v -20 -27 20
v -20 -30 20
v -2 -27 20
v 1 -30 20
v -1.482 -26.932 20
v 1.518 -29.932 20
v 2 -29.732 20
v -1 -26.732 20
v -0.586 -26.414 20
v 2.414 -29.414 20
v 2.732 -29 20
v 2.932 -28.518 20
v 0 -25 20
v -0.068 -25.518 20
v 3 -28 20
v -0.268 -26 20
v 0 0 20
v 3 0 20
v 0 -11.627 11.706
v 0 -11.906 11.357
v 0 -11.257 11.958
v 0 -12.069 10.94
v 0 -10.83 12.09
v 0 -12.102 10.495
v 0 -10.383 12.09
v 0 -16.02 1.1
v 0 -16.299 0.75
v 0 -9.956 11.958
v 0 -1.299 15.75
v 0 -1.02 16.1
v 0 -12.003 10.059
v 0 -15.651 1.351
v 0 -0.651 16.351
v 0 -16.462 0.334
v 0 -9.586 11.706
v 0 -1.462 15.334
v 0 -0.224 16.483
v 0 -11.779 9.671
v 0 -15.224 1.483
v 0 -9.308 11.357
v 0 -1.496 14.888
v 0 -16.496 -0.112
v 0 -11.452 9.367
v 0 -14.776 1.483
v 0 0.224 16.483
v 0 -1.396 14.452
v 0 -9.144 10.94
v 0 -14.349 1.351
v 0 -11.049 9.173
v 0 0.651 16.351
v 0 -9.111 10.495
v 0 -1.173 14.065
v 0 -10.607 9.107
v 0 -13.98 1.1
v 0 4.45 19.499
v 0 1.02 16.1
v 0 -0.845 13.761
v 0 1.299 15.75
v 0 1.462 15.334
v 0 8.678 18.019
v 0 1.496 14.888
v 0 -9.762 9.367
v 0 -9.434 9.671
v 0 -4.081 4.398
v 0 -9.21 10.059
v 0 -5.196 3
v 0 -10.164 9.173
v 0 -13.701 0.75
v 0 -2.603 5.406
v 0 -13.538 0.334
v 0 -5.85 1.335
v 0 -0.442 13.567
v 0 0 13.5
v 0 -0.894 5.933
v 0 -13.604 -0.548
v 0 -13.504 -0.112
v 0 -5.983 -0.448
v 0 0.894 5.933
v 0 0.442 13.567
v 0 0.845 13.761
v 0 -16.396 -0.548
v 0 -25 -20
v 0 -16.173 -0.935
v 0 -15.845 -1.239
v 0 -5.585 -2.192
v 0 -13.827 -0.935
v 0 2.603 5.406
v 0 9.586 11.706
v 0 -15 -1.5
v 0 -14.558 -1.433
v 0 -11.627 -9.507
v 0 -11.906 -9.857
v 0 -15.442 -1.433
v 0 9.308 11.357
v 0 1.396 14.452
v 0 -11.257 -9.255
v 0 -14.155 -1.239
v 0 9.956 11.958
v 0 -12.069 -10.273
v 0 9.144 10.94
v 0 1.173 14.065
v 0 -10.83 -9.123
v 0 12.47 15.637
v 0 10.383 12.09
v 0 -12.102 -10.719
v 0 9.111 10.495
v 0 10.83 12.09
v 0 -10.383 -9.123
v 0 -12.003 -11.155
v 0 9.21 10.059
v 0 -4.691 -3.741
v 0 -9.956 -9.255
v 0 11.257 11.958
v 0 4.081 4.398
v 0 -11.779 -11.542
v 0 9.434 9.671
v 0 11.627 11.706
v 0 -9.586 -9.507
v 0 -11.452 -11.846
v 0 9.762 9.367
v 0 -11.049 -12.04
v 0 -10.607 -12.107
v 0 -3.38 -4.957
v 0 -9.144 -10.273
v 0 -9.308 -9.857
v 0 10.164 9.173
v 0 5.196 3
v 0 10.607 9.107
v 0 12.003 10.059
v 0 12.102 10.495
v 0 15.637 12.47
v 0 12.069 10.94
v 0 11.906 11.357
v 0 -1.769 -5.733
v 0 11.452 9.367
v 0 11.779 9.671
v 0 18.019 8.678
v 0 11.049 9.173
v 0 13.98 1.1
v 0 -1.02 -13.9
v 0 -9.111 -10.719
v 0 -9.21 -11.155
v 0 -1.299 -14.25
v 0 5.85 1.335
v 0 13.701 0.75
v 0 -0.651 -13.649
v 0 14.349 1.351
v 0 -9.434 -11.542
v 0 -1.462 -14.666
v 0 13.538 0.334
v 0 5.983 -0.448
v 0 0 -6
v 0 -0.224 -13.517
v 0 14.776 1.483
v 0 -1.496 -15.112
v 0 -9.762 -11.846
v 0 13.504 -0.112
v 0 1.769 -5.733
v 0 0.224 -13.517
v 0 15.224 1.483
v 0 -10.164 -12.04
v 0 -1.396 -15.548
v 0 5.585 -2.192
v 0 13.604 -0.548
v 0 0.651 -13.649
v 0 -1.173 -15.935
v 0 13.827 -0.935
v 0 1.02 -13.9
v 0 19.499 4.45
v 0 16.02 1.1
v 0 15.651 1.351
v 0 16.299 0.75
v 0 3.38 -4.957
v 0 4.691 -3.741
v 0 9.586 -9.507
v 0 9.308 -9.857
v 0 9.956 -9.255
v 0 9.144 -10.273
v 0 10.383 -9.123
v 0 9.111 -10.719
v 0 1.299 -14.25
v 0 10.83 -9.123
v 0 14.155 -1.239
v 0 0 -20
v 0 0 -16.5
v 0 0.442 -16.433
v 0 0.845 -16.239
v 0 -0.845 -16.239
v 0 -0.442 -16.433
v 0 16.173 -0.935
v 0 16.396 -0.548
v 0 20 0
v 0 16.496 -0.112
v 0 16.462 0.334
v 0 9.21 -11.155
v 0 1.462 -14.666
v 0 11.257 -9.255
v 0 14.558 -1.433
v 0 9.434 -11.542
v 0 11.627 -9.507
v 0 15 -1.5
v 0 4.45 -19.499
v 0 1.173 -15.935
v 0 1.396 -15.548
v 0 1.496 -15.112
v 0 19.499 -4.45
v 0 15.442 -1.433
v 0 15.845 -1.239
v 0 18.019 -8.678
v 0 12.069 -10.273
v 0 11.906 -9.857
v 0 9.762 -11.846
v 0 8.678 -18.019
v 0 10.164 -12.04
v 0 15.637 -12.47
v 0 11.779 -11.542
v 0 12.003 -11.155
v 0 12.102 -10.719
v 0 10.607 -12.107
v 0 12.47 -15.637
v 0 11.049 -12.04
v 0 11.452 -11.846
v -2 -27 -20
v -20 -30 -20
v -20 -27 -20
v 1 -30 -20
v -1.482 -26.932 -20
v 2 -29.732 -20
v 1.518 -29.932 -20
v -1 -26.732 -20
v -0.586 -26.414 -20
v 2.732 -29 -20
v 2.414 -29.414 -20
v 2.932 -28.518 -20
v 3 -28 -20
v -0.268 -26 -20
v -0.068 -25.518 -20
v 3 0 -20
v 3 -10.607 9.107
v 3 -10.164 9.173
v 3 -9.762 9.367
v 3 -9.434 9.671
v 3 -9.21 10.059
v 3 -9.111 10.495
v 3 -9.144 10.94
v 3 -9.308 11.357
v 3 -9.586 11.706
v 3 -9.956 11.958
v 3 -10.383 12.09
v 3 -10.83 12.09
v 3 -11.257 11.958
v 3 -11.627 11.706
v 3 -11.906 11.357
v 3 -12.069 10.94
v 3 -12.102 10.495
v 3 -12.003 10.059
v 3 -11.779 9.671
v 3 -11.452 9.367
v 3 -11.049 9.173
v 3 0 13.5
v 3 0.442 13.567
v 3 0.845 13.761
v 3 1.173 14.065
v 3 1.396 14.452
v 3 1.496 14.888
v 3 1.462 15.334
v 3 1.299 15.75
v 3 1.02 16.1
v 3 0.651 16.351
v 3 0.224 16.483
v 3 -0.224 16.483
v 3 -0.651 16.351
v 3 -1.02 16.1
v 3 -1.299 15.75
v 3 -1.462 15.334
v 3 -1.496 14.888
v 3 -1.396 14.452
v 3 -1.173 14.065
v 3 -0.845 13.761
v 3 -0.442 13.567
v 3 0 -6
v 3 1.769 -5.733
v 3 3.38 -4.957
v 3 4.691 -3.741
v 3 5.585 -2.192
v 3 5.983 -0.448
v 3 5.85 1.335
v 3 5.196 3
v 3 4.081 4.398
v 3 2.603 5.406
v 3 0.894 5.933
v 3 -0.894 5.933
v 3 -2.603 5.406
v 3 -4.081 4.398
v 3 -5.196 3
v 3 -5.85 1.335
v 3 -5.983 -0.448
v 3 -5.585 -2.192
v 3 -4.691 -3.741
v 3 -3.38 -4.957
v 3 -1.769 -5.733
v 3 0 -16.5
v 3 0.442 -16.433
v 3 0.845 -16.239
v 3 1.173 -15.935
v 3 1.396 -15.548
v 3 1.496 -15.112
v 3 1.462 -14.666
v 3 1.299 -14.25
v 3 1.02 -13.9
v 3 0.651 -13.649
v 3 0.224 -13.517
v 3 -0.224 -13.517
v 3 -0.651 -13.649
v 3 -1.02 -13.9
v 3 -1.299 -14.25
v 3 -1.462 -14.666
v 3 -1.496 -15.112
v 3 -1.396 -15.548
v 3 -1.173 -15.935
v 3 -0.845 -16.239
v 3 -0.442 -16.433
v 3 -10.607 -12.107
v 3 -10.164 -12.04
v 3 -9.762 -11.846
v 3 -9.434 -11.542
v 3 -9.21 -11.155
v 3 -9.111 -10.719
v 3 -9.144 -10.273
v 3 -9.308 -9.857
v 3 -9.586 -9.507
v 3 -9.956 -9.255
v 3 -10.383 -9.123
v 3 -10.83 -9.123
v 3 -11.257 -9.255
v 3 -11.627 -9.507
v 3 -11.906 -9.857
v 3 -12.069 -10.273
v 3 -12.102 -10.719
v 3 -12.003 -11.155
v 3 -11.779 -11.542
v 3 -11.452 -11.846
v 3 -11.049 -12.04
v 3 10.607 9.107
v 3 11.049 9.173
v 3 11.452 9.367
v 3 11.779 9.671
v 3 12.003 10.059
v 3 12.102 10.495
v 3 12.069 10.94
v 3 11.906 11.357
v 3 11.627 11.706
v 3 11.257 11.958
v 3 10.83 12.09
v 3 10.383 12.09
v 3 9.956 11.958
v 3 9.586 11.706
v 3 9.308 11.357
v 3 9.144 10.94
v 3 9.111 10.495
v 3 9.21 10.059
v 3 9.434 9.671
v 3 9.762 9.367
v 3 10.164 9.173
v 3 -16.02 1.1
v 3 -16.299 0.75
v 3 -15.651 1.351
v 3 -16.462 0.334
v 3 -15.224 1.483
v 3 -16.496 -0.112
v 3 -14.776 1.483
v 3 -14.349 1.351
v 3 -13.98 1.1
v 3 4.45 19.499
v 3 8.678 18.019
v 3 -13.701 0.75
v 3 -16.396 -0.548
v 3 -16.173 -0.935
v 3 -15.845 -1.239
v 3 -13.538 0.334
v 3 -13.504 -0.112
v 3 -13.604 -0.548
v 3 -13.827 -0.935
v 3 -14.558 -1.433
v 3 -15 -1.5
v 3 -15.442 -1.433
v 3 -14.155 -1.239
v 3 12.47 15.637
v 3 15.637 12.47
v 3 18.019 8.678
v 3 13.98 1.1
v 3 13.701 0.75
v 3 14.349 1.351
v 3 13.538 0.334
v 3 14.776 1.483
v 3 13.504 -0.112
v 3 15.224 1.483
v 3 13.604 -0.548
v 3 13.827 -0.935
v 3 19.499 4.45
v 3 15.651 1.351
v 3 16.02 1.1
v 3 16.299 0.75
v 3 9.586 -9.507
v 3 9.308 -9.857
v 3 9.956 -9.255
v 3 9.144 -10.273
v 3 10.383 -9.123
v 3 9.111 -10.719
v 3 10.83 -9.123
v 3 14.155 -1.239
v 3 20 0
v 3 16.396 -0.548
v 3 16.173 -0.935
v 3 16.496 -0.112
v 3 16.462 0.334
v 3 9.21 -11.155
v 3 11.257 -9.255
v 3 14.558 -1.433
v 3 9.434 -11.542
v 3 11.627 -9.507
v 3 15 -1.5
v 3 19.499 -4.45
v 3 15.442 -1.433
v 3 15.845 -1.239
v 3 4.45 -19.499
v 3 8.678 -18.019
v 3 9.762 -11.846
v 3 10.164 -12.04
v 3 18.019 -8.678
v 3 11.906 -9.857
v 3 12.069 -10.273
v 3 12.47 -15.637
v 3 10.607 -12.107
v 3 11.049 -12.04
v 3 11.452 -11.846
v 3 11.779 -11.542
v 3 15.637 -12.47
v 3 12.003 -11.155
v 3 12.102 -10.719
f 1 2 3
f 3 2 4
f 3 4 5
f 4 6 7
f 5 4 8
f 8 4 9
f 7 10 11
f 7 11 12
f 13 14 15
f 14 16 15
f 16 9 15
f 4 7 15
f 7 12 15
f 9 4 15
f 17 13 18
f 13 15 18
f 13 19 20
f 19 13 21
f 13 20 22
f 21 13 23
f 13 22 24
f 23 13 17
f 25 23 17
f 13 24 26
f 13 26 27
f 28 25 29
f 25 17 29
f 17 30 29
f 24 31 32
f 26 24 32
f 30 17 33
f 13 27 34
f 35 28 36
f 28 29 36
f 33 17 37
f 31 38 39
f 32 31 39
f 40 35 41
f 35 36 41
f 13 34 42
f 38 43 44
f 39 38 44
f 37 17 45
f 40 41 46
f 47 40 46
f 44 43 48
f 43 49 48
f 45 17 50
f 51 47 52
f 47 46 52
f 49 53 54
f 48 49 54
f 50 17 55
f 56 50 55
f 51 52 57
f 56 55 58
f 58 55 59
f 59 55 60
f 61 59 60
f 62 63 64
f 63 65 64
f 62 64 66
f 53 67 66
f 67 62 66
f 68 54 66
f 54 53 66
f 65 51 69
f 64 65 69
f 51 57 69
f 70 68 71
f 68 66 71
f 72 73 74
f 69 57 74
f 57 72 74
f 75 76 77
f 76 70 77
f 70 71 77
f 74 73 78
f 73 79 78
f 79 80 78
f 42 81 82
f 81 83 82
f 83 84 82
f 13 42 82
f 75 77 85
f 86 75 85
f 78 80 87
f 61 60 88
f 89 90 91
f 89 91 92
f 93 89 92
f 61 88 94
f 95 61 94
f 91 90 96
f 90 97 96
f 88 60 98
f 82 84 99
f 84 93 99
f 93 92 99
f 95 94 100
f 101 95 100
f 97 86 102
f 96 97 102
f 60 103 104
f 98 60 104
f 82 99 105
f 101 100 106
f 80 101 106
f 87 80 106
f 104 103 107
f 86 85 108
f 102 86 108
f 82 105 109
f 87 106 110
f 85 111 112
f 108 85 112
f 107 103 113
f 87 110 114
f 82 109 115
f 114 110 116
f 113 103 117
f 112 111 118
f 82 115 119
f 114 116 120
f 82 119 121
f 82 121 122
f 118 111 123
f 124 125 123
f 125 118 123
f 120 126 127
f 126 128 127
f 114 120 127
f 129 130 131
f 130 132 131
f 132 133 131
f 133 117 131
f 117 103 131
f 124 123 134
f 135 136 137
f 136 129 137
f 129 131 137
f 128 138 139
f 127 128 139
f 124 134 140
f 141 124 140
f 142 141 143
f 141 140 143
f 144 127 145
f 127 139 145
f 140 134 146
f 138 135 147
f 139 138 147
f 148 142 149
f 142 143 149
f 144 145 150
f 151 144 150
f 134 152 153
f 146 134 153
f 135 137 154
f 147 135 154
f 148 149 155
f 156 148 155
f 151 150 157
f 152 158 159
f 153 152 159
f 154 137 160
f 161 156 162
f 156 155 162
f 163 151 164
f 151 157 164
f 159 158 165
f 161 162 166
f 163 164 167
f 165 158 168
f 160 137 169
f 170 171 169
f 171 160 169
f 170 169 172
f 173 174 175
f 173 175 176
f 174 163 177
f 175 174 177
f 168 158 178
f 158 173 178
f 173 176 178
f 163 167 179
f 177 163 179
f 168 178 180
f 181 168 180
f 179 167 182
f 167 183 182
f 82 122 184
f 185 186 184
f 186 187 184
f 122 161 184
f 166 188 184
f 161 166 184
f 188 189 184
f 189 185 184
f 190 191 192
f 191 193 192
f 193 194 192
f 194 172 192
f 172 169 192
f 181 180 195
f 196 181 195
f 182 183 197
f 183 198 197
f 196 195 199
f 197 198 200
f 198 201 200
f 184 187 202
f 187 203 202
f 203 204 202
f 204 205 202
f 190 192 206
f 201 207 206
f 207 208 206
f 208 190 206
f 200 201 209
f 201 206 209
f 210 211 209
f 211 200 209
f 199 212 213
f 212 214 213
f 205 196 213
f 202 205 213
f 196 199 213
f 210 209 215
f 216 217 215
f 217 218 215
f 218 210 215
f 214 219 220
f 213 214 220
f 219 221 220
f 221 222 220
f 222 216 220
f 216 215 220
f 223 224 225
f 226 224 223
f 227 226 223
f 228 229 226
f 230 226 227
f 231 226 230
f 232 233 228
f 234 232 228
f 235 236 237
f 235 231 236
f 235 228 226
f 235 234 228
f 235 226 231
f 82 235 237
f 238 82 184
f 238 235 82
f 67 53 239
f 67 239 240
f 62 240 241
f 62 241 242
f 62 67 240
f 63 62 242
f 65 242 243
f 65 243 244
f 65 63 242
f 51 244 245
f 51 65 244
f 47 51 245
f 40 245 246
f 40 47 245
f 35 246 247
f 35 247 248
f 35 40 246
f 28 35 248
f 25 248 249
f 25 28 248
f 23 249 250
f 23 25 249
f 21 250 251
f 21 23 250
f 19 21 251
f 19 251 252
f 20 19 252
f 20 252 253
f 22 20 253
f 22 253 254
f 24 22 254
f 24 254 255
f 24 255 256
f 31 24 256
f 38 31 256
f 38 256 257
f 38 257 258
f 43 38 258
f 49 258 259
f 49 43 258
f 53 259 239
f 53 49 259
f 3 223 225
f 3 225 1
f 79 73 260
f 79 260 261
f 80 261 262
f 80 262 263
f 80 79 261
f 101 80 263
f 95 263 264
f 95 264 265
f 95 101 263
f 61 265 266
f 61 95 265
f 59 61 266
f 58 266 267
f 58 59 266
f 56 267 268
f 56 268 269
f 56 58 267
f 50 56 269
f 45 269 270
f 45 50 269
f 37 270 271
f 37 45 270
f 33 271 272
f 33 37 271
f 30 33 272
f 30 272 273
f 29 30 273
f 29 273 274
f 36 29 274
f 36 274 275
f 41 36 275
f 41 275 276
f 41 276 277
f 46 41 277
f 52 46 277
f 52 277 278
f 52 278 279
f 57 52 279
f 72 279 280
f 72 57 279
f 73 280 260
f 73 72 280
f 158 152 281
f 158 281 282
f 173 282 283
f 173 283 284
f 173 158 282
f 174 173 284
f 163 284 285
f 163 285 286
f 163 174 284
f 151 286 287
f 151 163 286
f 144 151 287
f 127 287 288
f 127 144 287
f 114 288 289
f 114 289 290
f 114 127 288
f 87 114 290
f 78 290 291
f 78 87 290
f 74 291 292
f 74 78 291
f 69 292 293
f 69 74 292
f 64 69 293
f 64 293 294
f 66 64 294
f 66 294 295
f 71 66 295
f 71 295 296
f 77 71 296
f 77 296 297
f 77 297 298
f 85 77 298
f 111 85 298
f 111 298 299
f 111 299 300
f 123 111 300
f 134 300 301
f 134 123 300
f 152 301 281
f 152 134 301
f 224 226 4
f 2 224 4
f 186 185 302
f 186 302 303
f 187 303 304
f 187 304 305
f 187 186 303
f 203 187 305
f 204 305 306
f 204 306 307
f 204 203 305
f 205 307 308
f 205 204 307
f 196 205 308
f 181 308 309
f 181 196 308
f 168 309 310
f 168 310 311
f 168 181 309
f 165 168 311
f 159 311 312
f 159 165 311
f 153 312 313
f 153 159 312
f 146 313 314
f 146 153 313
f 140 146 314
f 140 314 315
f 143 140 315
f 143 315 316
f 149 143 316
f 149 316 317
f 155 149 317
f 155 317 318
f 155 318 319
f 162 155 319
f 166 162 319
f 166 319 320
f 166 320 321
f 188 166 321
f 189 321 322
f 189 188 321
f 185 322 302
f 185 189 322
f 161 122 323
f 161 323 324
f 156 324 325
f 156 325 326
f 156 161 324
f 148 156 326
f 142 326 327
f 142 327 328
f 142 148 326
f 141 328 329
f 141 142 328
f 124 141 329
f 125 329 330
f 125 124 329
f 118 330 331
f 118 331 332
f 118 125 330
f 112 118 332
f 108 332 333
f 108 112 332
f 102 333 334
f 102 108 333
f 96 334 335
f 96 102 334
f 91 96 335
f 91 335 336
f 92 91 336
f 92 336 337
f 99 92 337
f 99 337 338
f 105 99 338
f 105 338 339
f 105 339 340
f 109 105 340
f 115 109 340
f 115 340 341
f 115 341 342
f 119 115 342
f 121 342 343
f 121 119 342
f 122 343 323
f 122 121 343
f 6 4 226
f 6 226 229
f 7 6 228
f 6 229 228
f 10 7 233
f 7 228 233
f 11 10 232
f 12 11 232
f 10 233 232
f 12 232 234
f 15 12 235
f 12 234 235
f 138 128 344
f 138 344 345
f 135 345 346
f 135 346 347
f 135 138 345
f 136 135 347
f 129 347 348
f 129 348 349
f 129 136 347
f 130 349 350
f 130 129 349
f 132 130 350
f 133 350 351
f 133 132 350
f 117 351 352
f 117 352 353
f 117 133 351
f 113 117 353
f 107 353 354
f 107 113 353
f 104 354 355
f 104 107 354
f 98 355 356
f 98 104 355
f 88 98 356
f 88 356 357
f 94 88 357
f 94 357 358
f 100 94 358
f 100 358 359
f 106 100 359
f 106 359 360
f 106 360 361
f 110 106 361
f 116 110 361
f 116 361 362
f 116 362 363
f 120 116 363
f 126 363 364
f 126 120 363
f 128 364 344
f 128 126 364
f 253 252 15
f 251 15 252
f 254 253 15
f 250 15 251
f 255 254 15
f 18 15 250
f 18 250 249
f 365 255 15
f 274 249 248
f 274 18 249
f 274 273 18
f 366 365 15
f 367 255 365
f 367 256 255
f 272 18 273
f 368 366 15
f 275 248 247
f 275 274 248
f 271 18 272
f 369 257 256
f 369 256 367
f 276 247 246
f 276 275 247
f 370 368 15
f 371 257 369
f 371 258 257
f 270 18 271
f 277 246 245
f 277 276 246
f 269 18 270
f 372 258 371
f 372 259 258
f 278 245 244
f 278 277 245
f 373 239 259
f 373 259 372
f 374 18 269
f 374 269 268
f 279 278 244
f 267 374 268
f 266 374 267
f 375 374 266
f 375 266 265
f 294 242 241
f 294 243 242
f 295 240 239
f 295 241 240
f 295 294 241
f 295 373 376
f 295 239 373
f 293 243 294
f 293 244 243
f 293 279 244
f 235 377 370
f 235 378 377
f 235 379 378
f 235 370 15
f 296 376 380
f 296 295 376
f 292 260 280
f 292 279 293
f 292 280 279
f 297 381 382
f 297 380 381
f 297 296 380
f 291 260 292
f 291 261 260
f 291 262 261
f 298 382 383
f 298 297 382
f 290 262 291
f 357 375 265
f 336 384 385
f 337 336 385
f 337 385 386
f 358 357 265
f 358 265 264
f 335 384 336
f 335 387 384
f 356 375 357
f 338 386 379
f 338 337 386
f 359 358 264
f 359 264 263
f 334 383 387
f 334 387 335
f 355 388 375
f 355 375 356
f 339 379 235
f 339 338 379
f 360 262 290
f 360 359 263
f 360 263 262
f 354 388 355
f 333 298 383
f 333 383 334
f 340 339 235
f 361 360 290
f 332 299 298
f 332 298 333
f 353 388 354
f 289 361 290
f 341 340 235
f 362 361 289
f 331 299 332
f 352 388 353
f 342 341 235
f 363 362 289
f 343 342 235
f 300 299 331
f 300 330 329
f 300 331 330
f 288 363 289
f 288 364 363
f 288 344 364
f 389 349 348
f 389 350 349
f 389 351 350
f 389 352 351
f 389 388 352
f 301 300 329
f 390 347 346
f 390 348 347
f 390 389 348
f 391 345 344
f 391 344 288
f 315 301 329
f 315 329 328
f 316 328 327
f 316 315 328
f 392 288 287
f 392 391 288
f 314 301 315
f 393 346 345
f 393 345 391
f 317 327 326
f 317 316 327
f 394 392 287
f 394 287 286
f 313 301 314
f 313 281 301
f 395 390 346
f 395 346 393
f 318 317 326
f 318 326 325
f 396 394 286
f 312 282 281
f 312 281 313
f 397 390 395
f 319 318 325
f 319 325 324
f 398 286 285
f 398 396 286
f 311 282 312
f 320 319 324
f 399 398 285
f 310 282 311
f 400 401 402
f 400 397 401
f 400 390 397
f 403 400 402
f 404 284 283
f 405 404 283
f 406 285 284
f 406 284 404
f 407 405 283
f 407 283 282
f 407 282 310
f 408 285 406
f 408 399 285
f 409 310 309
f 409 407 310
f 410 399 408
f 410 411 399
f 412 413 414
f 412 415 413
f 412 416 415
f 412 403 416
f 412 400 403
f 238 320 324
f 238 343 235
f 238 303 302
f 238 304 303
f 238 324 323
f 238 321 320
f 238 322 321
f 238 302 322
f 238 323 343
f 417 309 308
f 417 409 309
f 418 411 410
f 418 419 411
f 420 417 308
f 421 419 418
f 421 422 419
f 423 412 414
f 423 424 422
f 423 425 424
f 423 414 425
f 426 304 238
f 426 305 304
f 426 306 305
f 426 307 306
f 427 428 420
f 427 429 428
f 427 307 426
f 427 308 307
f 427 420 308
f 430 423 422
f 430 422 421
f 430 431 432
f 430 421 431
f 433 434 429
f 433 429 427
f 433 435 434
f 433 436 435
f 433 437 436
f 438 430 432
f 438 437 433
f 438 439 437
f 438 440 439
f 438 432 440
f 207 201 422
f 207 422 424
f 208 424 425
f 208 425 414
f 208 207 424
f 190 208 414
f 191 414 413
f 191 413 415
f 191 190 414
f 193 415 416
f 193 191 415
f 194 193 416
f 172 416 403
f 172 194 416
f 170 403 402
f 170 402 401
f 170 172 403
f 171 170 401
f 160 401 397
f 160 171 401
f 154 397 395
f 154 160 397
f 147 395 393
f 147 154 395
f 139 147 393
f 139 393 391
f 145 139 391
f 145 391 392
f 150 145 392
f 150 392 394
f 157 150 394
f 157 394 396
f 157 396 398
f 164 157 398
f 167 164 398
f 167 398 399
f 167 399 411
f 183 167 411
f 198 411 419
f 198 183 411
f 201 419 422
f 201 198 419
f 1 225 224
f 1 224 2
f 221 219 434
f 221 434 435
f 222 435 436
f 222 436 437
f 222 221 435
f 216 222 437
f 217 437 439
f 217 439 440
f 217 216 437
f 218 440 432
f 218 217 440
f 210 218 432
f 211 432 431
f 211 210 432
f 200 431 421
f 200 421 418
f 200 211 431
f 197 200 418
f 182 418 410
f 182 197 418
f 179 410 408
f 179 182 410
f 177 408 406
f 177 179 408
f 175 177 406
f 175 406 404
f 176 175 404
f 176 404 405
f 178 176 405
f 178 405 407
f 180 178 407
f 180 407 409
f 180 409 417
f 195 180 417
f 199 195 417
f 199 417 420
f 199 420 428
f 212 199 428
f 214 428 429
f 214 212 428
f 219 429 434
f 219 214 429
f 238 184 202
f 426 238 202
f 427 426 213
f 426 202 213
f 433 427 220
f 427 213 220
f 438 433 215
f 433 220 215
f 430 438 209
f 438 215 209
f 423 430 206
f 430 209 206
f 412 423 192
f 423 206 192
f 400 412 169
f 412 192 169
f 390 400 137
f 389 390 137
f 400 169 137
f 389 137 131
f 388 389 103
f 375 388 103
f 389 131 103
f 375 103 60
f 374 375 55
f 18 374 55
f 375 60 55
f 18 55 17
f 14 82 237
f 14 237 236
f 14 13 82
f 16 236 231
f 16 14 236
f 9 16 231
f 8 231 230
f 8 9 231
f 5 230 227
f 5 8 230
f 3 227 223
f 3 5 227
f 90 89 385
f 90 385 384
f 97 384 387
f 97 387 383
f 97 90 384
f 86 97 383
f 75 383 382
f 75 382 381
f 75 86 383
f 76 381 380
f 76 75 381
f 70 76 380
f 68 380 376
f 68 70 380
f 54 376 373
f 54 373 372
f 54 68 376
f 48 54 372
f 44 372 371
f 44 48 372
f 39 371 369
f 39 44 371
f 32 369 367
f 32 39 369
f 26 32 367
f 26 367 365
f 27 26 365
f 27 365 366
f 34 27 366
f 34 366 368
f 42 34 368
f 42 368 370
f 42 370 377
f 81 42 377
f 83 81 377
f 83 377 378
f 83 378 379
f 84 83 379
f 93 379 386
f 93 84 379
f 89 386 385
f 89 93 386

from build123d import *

# Parameters (mm, degrees)
BOSS_EXTRUDE1_OUTLINE_R   = 1.5
BOSS_EXTRUDE1_OUTLINE_R_2 = 6
BOSS_EXTRUDE1_DEPTH       = 3
SKETCH2_W                 = 40
SKETCH2_H                 = 3
BOSS_EXTRUDE2_DEPTH       = 20
FILLET1_R                 = 2
FILLET2_R                 = 2


# Read off the part's stored shape, not the designer's step: Boss-Extrude1
with BuildPart() as part:
    # Boss-Extrude1 outline → Boss-Extrude1 (new body)
    with BuildSketch(Plane(origin=(0, 0, 0), x_dir=(0, 0, -1), z_dir=(1, 0, 0))):
        with BuildLine():
            Line((20, -30), (20, 0))
            ThreePointArc((20, 0), (0, 20), (-20, 0))
            Line((-20, 0), (-20, -30))
            Line((-20, -30), (20, -30))
        make_face()
        with Locations((-10.606601718, -10.606601718)):
            Circle(BOSS_EXTRUDE1_OUTLINE_R, mode=Mode.SUBTRACT)
        with Locations((0, -15)):
            Circle(BOSS_EXTRUDE1_OUTLINE_R, mode=Mode.SUBTRACT)
        with Locations((10.606601718, -10.606601718)):
            Circle(BOSS_EXTRUDE1_OUTLINE_R, mode=Mode.SUBTRACT)
        with Locations((-15, 0)):
            Circle(BOSS_EXTRUDE1_OUTLINE_R, mode=Mode.SUBTRACT)
        with Locations((-10.606601718, 10.606601718)):
            Circle(BOSS_EXTRUDE1_OUTLINE_R, mode=Mode.SUBTRACT)
        Circle(BOSS_EXTRUDE1_OUTLINE_R_2, mode=Mode.SUBTRACT)
        with Locations((15, 0)):
            Circle(BOSS_EXTRUDE1_OUTLINE_R, mode=Mode.SUBTRACT)
        with Locations((0, 15)):
            Circle(BOSS_EXTRUDE1_OUTLINE_R, mode=Mode.SUBTRACT)
        with Locations((10.606601718, 10.606601718)):
            Circle(BOSS_EXTRUDE1_OUTLINE_R, mode=Mode.SUBTRACT)
    extrude(amount=BOSS_EXTRUDE1_DEPTH)

    # Sketch2 → Boss-Extrude2 (add)
    with BuildSketch(Plane.ZY):
        with Locations((0, -28.5)):
            Rectangle(SKETCH2_W, SKETCH2_H)
    extrude(amount=BOSS_EXTRUDE2_DEPTH)

    # Fillet1
    fillet1_edges = [part.edges().sort_by_distance(p)[0] for p in [
        (3, -30, 0),
    ]]
    fillet(fillet1_edges, radius=FILLET1_R)

    # Fillet2
    fillet2_edges = [part.edges().sort_by_distance(p)[0] for p in [
        (0, -27, 0),
    ]]
    fillet(fillet2_edges, radius=FILLET2_R)


solid = part.part
